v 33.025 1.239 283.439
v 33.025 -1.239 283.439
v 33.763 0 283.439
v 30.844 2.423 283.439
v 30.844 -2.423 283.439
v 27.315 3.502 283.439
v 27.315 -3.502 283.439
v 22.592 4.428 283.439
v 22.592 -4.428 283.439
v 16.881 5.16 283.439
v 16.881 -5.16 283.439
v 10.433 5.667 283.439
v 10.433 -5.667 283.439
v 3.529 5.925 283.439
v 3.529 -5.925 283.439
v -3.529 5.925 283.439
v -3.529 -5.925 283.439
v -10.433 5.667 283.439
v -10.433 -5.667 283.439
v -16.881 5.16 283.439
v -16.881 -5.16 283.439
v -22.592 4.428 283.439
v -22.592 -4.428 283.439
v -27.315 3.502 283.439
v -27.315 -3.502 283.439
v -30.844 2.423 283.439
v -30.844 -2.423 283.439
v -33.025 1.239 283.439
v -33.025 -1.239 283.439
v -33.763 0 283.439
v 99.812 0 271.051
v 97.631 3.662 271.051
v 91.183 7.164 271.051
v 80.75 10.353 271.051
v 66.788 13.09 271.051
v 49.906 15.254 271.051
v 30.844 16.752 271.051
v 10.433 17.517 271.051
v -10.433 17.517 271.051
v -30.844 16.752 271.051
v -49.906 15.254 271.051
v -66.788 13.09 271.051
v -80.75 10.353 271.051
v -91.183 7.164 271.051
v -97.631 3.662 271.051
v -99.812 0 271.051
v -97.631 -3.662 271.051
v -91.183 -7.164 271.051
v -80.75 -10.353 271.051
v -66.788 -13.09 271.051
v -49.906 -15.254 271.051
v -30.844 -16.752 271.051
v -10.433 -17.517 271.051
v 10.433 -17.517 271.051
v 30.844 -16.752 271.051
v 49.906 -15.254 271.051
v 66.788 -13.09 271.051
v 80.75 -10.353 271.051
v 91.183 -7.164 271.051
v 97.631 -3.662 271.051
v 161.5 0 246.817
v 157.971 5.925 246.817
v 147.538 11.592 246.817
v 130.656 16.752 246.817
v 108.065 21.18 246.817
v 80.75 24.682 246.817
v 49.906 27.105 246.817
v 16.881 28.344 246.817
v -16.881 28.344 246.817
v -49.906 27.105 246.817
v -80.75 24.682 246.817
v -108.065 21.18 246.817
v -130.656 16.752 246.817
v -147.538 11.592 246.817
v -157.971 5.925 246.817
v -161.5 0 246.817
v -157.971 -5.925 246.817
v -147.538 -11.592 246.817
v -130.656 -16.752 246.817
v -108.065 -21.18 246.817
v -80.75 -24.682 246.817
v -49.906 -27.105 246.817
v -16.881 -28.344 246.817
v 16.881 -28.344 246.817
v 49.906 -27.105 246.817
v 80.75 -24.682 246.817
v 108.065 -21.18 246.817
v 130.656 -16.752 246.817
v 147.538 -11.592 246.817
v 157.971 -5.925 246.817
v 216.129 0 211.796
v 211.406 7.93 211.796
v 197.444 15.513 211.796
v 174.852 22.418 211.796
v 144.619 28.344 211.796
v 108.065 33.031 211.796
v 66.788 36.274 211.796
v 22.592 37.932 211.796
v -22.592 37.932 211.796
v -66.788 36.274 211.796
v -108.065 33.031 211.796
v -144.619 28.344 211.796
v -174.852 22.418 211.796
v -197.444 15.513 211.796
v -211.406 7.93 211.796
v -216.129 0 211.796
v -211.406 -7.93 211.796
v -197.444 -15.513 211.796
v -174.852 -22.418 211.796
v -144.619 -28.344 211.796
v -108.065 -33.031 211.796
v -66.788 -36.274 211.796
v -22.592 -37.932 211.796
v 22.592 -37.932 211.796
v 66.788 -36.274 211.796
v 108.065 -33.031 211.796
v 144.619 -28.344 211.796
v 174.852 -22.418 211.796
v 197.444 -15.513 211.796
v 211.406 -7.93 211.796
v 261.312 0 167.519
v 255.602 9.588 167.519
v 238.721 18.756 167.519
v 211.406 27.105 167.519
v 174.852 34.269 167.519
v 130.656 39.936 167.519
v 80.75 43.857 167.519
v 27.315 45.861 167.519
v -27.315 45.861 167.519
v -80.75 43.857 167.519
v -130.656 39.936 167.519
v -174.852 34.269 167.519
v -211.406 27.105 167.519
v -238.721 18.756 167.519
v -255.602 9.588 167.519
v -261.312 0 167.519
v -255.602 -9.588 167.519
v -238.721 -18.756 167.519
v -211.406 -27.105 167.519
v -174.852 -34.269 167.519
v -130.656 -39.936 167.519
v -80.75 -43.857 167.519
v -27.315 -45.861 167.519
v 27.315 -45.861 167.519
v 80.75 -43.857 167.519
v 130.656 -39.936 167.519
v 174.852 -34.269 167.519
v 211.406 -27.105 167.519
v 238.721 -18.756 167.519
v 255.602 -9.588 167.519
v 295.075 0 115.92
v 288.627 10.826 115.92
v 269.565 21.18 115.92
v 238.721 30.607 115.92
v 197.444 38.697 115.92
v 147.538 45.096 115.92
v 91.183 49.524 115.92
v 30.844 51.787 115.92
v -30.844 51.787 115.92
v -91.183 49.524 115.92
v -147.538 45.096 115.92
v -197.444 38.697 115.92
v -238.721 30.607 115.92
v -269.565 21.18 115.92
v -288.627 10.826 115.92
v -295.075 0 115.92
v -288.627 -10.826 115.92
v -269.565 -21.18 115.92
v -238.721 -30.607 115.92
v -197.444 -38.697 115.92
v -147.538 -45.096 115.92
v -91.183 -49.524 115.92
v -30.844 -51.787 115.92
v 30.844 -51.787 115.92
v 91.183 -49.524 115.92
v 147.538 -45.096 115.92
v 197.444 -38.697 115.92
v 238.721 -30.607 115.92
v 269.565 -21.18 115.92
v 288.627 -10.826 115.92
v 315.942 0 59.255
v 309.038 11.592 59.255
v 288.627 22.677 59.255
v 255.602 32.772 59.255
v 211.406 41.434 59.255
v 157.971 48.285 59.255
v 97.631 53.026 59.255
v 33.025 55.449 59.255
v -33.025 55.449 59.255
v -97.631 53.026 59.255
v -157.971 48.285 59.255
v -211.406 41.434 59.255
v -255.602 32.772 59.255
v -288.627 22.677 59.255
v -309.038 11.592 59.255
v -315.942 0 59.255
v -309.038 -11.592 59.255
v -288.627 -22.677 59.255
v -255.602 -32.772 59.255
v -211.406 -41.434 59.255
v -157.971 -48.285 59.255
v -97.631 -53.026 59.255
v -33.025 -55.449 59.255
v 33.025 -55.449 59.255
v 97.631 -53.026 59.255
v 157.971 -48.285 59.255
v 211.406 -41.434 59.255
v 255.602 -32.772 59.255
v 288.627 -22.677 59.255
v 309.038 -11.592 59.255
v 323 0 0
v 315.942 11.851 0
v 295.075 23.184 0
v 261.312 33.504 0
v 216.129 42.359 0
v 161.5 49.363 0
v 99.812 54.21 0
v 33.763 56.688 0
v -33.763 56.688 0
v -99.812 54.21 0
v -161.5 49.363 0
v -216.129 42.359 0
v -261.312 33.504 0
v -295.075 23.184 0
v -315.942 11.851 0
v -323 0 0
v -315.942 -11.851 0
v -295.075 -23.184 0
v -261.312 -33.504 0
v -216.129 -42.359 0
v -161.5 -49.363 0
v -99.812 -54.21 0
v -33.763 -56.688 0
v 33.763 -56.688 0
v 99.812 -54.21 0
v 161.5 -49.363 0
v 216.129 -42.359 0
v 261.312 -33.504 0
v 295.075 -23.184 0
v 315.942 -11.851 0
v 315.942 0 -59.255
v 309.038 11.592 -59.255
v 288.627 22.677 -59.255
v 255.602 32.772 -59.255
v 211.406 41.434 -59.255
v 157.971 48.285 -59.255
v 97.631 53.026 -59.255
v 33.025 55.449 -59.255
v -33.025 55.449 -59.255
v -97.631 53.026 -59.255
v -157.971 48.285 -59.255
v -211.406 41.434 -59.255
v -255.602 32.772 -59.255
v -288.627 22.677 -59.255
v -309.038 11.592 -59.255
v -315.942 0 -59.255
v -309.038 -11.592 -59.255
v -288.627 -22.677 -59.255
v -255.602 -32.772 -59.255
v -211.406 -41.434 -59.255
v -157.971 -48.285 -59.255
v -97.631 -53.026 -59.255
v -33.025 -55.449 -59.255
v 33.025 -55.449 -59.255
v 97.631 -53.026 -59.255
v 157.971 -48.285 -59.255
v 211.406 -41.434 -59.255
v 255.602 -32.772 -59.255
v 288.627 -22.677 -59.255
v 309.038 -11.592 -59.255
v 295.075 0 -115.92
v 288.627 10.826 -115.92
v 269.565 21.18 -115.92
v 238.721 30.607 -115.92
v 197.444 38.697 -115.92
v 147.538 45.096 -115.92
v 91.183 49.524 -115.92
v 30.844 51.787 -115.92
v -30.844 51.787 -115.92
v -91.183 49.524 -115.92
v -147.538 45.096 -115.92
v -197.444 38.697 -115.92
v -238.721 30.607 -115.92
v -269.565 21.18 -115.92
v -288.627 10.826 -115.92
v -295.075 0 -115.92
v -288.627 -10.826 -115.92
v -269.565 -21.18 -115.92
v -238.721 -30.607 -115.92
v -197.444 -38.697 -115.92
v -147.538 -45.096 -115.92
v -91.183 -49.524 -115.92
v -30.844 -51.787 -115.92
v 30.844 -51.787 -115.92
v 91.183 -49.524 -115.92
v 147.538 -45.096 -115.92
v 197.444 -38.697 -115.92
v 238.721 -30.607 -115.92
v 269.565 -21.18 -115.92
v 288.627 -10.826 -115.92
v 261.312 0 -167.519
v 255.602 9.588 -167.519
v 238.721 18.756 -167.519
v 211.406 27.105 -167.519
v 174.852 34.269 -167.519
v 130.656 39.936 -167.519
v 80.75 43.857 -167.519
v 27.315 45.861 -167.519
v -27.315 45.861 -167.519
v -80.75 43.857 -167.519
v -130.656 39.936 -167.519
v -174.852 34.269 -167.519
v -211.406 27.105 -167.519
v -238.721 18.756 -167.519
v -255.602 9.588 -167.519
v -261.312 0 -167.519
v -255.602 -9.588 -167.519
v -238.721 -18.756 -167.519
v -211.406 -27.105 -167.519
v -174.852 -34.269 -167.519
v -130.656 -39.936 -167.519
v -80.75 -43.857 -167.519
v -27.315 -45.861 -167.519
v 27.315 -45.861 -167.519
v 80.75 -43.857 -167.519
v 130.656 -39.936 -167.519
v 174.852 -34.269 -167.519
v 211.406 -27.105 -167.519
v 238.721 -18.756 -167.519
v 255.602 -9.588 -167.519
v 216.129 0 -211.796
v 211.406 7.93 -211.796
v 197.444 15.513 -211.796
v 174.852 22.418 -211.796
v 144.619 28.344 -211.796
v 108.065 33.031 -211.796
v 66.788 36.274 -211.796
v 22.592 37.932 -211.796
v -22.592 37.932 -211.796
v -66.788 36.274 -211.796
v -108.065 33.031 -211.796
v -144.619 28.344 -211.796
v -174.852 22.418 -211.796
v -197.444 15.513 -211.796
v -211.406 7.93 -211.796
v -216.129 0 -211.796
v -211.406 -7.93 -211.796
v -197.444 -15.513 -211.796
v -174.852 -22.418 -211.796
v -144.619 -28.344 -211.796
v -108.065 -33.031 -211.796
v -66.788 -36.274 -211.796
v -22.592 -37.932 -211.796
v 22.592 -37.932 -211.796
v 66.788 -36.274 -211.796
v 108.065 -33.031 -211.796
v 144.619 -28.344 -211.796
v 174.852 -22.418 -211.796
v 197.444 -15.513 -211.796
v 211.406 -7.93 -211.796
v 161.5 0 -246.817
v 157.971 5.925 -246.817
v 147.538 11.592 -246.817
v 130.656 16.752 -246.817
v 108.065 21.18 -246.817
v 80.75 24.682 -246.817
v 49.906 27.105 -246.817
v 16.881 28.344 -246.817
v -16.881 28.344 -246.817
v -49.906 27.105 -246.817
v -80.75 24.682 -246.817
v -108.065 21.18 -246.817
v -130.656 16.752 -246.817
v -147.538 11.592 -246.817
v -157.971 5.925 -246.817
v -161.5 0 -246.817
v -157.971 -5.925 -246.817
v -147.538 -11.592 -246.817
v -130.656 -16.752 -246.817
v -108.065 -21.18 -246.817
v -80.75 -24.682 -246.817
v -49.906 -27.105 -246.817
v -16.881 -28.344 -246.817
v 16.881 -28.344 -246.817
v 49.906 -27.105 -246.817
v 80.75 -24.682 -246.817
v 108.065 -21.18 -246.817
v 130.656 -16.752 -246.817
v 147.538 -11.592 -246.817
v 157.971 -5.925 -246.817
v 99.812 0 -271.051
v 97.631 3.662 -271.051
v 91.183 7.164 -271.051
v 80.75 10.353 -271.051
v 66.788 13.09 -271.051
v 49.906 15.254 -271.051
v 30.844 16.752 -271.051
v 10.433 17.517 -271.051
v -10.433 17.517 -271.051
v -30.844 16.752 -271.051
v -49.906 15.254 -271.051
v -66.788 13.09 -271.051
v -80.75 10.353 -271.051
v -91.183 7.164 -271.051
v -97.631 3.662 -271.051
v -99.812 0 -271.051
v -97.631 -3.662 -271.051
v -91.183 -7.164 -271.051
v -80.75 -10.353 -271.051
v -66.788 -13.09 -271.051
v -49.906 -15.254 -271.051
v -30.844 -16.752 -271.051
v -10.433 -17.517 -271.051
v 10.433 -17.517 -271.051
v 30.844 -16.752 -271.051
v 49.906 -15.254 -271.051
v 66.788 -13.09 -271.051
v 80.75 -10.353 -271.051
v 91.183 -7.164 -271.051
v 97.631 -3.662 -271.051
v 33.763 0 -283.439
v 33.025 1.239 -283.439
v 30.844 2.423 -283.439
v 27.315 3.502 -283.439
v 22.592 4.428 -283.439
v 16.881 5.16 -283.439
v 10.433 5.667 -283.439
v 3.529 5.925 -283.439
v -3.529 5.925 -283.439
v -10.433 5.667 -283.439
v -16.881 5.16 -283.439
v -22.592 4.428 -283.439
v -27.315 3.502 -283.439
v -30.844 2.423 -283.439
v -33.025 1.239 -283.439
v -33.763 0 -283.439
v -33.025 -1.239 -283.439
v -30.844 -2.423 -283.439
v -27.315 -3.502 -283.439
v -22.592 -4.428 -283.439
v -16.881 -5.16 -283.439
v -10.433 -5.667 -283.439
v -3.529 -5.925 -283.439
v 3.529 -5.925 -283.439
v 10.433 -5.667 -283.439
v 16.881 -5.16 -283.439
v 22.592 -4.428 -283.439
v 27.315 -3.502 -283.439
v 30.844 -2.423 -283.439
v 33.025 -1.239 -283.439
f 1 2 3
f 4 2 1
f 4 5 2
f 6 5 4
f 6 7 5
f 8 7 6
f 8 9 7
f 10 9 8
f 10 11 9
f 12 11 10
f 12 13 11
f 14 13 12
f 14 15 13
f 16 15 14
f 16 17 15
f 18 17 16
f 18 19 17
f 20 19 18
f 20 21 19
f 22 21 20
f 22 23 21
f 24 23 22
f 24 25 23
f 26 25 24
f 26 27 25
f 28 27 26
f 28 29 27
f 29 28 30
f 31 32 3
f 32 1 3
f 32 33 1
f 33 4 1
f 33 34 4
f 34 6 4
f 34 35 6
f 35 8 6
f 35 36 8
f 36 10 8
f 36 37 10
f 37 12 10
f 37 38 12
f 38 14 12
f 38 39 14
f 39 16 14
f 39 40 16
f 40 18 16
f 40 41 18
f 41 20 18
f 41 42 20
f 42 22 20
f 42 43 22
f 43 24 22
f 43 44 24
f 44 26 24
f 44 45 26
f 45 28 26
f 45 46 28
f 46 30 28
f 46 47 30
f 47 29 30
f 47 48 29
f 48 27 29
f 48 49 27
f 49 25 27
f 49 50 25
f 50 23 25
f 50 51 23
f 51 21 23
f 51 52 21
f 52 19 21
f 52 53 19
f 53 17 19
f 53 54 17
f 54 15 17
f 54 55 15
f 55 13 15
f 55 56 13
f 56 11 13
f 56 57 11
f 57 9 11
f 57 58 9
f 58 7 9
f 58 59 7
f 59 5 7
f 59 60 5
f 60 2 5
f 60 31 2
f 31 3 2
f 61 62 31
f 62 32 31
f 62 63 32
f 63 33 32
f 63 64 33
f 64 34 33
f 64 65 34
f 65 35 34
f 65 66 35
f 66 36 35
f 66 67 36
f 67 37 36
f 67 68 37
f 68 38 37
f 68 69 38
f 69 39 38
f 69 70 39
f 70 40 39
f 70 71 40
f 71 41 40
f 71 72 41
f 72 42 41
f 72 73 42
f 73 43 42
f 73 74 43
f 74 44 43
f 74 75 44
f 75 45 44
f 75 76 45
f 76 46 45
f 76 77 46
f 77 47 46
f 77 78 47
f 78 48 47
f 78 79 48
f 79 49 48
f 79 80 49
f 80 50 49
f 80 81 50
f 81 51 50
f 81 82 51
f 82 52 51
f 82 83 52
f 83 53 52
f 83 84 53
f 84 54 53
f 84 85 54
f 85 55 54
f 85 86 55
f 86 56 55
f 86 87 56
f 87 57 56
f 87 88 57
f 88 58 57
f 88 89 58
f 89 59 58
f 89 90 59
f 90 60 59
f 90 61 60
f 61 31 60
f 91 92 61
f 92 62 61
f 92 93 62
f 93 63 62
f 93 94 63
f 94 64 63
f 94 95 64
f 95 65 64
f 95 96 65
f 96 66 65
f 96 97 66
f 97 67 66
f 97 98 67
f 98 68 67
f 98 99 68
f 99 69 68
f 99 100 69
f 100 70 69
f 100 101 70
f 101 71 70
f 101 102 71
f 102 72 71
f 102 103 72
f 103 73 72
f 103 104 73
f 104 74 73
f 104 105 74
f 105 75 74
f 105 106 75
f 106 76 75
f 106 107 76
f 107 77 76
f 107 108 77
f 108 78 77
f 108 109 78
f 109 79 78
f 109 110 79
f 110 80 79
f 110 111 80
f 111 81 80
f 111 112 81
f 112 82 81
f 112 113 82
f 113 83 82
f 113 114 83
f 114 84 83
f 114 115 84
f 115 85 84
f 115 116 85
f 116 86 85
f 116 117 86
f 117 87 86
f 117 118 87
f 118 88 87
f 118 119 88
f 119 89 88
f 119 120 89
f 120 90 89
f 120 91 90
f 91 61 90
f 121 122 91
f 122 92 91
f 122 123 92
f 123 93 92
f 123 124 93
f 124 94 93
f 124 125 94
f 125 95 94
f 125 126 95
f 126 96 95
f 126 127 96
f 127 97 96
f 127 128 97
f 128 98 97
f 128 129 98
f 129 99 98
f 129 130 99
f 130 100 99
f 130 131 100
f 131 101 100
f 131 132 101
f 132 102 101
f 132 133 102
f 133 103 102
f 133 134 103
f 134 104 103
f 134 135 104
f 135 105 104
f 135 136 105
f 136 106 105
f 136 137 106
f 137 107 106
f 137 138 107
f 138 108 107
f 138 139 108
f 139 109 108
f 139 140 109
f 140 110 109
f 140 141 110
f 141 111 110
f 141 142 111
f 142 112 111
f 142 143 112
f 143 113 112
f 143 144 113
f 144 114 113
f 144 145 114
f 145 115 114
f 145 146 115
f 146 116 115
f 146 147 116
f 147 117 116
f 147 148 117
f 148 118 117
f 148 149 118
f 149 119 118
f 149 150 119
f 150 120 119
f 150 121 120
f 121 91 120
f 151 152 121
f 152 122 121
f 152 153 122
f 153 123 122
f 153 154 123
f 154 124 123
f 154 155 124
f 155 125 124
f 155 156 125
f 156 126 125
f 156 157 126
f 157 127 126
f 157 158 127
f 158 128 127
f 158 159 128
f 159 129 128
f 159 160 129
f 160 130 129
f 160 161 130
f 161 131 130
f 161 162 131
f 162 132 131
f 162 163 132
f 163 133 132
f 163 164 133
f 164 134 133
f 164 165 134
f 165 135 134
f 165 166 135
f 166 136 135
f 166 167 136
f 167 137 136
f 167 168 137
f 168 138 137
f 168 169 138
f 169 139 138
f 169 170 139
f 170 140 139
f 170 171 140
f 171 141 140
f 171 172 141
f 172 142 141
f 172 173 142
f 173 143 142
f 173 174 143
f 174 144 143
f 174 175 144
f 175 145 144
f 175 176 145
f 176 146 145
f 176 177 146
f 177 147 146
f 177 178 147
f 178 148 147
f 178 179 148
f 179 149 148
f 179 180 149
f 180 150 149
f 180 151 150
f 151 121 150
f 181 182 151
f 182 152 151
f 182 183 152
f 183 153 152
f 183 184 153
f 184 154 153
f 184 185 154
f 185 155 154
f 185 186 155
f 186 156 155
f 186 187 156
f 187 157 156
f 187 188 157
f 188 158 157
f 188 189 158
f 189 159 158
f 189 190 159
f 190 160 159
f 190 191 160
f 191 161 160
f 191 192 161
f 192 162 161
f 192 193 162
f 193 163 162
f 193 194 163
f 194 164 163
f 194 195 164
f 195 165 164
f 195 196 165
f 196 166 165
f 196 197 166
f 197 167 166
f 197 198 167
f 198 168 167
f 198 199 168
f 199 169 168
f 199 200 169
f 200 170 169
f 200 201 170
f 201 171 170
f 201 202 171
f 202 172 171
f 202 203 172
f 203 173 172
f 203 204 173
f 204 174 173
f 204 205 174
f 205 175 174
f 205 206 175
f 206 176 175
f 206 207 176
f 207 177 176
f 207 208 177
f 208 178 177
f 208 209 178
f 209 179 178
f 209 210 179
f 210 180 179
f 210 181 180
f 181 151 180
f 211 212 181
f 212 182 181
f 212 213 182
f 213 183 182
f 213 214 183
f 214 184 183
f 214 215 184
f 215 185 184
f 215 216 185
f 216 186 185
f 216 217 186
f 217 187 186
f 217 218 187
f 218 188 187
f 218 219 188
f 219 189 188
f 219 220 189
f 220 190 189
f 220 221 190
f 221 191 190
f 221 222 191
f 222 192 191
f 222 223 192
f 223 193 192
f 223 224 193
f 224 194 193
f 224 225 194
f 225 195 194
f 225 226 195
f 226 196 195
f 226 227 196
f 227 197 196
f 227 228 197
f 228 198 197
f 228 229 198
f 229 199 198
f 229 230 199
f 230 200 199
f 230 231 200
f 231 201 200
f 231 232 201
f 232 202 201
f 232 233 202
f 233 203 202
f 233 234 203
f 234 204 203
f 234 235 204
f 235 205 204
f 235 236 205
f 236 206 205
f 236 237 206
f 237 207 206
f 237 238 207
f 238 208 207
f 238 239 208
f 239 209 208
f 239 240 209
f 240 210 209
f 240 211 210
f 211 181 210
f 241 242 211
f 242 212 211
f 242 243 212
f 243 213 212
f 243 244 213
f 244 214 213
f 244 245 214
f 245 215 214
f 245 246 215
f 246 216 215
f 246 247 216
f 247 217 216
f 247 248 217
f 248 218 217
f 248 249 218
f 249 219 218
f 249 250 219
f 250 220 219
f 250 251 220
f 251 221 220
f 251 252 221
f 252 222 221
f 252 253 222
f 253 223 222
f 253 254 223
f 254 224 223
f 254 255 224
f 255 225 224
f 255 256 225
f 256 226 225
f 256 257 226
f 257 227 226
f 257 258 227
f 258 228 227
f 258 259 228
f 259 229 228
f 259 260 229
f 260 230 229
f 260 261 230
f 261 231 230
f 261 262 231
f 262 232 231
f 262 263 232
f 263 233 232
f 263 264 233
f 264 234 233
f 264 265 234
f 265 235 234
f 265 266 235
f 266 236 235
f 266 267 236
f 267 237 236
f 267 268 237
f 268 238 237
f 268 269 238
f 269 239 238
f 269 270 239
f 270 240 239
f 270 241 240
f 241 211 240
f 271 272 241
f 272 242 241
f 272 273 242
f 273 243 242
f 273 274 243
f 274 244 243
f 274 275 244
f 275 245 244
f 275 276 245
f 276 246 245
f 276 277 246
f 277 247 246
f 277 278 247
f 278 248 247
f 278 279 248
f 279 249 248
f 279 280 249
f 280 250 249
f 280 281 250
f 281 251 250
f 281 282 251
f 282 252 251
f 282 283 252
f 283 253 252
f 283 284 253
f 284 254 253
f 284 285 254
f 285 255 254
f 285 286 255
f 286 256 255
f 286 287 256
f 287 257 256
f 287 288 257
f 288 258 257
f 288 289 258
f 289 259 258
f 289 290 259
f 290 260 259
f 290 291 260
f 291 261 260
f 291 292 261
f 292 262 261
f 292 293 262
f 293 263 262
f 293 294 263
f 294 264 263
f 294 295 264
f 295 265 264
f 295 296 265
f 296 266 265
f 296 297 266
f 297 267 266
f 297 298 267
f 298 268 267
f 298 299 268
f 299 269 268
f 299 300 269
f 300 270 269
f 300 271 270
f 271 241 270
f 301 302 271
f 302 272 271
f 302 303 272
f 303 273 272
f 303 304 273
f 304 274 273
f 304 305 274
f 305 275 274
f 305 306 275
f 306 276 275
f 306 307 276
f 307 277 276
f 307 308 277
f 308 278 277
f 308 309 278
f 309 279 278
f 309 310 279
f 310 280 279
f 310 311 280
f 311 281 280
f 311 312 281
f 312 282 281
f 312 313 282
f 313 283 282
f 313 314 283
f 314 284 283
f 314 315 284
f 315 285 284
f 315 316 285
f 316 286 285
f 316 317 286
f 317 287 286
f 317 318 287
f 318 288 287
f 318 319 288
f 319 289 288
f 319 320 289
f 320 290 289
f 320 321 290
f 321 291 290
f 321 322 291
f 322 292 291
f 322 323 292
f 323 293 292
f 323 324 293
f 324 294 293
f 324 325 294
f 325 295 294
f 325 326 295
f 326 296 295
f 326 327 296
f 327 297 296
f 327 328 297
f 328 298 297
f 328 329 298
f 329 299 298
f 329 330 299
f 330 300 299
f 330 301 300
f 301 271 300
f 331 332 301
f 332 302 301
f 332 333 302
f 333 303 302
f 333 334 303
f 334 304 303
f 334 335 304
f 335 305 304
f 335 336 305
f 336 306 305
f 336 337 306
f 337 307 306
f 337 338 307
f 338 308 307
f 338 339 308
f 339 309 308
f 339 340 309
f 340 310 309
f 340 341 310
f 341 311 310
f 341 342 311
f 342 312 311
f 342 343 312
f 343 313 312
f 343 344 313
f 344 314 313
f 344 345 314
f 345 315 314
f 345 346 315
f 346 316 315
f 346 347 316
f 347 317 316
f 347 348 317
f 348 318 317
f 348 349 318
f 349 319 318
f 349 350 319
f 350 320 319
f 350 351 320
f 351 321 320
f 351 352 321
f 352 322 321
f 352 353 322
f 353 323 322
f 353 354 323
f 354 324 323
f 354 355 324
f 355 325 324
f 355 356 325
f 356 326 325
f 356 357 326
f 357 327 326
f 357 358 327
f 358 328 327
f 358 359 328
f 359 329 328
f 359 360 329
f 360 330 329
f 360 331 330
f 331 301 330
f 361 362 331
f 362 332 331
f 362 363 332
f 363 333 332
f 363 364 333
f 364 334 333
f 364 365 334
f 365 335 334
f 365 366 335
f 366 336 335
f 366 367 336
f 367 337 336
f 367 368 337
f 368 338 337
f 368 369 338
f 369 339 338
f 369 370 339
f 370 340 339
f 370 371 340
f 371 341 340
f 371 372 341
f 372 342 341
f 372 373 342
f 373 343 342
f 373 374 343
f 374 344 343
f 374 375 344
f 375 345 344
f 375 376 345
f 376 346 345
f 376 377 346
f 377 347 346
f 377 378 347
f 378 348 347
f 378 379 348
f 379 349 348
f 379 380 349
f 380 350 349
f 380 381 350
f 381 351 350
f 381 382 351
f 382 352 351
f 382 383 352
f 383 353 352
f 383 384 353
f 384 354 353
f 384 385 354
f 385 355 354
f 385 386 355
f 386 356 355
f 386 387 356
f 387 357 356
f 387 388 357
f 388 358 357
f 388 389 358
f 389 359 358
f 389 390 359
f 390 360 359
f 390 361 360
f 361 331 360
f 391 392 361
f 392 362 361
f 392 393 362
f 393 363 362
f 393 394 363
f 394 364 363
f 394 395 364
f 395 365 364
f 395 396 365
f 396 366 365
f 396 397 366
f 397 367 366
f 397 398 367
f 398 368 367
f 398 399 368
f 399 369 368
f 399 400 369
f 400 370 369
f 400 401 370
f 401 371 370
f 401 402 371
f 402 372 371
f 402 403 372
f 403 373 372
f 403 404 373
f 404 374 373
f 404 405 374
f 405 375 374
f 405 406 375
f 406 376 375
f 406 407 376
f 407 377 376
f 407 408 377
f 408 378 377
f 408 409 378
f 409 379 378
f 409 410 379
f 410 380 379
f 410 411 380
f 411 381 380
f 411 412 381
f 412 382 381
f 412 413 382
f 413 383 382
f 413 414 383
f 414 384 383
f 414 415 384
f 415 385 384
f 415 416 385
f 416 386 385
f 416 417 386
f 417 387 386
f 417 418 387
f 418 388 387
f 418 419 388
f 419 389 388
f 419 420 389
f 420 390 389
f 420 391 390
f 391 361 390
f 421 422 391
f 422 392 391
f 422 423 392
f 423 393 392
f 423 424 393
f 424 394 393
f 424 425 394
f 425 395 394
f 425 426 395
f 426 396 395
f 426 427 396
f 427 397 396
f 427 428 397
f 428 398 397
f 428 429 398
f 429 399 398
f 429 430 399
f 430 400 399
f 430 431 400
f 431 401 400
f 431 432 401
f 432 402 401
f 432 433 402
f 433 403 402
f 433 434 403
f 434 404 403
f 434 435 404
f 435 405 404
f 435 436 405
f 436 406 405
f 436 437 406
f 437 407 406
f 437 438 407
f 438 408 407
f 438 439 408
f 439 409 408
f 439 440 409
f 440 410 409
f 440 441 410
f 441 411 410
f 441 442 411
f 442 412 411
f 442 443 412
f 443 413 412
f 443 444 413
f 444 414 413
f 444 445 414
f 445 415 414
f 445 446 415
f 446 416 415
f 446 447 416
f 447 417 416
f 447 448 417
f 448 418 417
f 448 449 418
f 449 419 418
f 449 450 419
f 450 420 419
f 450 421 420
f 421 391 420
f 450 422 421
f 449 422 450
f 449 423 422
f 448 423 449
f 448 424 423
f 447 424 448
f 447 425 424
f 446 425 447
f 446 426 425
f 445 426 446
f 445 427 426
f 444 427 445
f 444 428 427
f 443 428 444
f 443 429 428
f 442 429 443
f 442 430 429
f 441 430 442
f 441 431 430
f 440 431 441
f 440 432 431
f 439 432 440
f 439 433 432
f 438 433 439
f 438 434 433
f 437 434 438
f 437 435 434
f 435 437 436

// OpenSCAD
// Generated by SolidPython 1.0.1 on 2020-07-29 00:46:52


scale(v = [17, 3, 15]) {
	sphere(r = 19);
}
/***********************************************
*********      SolidPython code:      **********
************************************************
 
# import packages: SolidPython
from solid import *
from solid.utils import *
from itertools import chain, combinations, permutations


class Resize:

    def __init__(self, scad_file):
        self.scad_file = scad_file
        #self.scad_file = import_scad(scad_file)
        # cone/cylinder param:
        self.r1 = 0
        self.r2 = 0
        self.h = 0
        # rectangular prism param:
        self.w = 0
        self.l = 0
        # ellipse param:
        self.r = 0

    # import OpenScad code (file name corresponds to shape)


    # classify shape + parameters
    def assign(self, param1, param2, param3):
        if self.scad_file == 'cone.scad':
            self.r1 = param1
            self.r2 = param2
            self.h = param3
        elif self.scad_file == 'cylinder.scad':
            self.r1 = param1
            self.r2 = param2
            self.h = param3
        elif self.scad_file == 'rectangularPrism.scad':
            self.h = param1
            self.l = param2
            self.w = param3
        else:
            self.r = param1
            self.h = param2

    # resize parameters
    def iterate(self):
        x = range(3, 20, 2)
        i = 1
        if self.scad_file == 'cone.scad':
            tempList = list(permutations(x, 2))
            for temp in tempList:
                param1 = temp[0]
                param2 = temp[1]
                filepath = 'produced_scad_files/' + 'cone' + str(param1) + '_' + str(param2) + '_' + '.scad'
                scad_render_to_file(cylinder(h=param1, r1=param2, r2=0), filepath)

        elif self.scad_file == 'cylinder.scad':
            tempList = list(permutations(x, 3))
            for temp in tempList:
                param1 = temp[0]
                param2 = temp[1]
                filepath = 'produced_scad_files/' + 'cylinder' + str(param1) + '_' + str(param2) + '_' + '.scad'
                scad_render_to_file(cylinder(h=param1, r1=param2, r2=param2), filepath)

        elif self.scad_file == 'rectangularPrism.scad':
            tempList = list(permutations(x, 3))
            for temp in tempList:
                param1 = temp[0]
                param2 = temp[1]
                param3 = temp[2]
                filepath = 'produced_scad_files/' + 'rectangularPrism' + str(param1) + '_' + str(param2) + '_' + str(
                    param3) + '.scad'
                scad_render_to_file(cube(size=(param1, param2, param3)), filepath)

        elif self.scad_file == 'ellipse.scad':
            tempList = list(permutations(x, 4))
            for temp in tempList:
                param1 = temp[0]
                param2 = temp[1]
                param3 = temp[2]
                param4 = temp[3]
                filepath = 'produced_scad_files/' + 'ellipse' + str(param1) + '_' + str(param2) + '_' + str(param3) + '_' + str(param4) + '.scad'
                scad_render_to_file(scale([param1, param2, param3])(sphere(r=param4)), filepath)

    def render_to_scadfile(self):
        scad_render_to_file(scad, 'example.scad') 
 
************************************************/
